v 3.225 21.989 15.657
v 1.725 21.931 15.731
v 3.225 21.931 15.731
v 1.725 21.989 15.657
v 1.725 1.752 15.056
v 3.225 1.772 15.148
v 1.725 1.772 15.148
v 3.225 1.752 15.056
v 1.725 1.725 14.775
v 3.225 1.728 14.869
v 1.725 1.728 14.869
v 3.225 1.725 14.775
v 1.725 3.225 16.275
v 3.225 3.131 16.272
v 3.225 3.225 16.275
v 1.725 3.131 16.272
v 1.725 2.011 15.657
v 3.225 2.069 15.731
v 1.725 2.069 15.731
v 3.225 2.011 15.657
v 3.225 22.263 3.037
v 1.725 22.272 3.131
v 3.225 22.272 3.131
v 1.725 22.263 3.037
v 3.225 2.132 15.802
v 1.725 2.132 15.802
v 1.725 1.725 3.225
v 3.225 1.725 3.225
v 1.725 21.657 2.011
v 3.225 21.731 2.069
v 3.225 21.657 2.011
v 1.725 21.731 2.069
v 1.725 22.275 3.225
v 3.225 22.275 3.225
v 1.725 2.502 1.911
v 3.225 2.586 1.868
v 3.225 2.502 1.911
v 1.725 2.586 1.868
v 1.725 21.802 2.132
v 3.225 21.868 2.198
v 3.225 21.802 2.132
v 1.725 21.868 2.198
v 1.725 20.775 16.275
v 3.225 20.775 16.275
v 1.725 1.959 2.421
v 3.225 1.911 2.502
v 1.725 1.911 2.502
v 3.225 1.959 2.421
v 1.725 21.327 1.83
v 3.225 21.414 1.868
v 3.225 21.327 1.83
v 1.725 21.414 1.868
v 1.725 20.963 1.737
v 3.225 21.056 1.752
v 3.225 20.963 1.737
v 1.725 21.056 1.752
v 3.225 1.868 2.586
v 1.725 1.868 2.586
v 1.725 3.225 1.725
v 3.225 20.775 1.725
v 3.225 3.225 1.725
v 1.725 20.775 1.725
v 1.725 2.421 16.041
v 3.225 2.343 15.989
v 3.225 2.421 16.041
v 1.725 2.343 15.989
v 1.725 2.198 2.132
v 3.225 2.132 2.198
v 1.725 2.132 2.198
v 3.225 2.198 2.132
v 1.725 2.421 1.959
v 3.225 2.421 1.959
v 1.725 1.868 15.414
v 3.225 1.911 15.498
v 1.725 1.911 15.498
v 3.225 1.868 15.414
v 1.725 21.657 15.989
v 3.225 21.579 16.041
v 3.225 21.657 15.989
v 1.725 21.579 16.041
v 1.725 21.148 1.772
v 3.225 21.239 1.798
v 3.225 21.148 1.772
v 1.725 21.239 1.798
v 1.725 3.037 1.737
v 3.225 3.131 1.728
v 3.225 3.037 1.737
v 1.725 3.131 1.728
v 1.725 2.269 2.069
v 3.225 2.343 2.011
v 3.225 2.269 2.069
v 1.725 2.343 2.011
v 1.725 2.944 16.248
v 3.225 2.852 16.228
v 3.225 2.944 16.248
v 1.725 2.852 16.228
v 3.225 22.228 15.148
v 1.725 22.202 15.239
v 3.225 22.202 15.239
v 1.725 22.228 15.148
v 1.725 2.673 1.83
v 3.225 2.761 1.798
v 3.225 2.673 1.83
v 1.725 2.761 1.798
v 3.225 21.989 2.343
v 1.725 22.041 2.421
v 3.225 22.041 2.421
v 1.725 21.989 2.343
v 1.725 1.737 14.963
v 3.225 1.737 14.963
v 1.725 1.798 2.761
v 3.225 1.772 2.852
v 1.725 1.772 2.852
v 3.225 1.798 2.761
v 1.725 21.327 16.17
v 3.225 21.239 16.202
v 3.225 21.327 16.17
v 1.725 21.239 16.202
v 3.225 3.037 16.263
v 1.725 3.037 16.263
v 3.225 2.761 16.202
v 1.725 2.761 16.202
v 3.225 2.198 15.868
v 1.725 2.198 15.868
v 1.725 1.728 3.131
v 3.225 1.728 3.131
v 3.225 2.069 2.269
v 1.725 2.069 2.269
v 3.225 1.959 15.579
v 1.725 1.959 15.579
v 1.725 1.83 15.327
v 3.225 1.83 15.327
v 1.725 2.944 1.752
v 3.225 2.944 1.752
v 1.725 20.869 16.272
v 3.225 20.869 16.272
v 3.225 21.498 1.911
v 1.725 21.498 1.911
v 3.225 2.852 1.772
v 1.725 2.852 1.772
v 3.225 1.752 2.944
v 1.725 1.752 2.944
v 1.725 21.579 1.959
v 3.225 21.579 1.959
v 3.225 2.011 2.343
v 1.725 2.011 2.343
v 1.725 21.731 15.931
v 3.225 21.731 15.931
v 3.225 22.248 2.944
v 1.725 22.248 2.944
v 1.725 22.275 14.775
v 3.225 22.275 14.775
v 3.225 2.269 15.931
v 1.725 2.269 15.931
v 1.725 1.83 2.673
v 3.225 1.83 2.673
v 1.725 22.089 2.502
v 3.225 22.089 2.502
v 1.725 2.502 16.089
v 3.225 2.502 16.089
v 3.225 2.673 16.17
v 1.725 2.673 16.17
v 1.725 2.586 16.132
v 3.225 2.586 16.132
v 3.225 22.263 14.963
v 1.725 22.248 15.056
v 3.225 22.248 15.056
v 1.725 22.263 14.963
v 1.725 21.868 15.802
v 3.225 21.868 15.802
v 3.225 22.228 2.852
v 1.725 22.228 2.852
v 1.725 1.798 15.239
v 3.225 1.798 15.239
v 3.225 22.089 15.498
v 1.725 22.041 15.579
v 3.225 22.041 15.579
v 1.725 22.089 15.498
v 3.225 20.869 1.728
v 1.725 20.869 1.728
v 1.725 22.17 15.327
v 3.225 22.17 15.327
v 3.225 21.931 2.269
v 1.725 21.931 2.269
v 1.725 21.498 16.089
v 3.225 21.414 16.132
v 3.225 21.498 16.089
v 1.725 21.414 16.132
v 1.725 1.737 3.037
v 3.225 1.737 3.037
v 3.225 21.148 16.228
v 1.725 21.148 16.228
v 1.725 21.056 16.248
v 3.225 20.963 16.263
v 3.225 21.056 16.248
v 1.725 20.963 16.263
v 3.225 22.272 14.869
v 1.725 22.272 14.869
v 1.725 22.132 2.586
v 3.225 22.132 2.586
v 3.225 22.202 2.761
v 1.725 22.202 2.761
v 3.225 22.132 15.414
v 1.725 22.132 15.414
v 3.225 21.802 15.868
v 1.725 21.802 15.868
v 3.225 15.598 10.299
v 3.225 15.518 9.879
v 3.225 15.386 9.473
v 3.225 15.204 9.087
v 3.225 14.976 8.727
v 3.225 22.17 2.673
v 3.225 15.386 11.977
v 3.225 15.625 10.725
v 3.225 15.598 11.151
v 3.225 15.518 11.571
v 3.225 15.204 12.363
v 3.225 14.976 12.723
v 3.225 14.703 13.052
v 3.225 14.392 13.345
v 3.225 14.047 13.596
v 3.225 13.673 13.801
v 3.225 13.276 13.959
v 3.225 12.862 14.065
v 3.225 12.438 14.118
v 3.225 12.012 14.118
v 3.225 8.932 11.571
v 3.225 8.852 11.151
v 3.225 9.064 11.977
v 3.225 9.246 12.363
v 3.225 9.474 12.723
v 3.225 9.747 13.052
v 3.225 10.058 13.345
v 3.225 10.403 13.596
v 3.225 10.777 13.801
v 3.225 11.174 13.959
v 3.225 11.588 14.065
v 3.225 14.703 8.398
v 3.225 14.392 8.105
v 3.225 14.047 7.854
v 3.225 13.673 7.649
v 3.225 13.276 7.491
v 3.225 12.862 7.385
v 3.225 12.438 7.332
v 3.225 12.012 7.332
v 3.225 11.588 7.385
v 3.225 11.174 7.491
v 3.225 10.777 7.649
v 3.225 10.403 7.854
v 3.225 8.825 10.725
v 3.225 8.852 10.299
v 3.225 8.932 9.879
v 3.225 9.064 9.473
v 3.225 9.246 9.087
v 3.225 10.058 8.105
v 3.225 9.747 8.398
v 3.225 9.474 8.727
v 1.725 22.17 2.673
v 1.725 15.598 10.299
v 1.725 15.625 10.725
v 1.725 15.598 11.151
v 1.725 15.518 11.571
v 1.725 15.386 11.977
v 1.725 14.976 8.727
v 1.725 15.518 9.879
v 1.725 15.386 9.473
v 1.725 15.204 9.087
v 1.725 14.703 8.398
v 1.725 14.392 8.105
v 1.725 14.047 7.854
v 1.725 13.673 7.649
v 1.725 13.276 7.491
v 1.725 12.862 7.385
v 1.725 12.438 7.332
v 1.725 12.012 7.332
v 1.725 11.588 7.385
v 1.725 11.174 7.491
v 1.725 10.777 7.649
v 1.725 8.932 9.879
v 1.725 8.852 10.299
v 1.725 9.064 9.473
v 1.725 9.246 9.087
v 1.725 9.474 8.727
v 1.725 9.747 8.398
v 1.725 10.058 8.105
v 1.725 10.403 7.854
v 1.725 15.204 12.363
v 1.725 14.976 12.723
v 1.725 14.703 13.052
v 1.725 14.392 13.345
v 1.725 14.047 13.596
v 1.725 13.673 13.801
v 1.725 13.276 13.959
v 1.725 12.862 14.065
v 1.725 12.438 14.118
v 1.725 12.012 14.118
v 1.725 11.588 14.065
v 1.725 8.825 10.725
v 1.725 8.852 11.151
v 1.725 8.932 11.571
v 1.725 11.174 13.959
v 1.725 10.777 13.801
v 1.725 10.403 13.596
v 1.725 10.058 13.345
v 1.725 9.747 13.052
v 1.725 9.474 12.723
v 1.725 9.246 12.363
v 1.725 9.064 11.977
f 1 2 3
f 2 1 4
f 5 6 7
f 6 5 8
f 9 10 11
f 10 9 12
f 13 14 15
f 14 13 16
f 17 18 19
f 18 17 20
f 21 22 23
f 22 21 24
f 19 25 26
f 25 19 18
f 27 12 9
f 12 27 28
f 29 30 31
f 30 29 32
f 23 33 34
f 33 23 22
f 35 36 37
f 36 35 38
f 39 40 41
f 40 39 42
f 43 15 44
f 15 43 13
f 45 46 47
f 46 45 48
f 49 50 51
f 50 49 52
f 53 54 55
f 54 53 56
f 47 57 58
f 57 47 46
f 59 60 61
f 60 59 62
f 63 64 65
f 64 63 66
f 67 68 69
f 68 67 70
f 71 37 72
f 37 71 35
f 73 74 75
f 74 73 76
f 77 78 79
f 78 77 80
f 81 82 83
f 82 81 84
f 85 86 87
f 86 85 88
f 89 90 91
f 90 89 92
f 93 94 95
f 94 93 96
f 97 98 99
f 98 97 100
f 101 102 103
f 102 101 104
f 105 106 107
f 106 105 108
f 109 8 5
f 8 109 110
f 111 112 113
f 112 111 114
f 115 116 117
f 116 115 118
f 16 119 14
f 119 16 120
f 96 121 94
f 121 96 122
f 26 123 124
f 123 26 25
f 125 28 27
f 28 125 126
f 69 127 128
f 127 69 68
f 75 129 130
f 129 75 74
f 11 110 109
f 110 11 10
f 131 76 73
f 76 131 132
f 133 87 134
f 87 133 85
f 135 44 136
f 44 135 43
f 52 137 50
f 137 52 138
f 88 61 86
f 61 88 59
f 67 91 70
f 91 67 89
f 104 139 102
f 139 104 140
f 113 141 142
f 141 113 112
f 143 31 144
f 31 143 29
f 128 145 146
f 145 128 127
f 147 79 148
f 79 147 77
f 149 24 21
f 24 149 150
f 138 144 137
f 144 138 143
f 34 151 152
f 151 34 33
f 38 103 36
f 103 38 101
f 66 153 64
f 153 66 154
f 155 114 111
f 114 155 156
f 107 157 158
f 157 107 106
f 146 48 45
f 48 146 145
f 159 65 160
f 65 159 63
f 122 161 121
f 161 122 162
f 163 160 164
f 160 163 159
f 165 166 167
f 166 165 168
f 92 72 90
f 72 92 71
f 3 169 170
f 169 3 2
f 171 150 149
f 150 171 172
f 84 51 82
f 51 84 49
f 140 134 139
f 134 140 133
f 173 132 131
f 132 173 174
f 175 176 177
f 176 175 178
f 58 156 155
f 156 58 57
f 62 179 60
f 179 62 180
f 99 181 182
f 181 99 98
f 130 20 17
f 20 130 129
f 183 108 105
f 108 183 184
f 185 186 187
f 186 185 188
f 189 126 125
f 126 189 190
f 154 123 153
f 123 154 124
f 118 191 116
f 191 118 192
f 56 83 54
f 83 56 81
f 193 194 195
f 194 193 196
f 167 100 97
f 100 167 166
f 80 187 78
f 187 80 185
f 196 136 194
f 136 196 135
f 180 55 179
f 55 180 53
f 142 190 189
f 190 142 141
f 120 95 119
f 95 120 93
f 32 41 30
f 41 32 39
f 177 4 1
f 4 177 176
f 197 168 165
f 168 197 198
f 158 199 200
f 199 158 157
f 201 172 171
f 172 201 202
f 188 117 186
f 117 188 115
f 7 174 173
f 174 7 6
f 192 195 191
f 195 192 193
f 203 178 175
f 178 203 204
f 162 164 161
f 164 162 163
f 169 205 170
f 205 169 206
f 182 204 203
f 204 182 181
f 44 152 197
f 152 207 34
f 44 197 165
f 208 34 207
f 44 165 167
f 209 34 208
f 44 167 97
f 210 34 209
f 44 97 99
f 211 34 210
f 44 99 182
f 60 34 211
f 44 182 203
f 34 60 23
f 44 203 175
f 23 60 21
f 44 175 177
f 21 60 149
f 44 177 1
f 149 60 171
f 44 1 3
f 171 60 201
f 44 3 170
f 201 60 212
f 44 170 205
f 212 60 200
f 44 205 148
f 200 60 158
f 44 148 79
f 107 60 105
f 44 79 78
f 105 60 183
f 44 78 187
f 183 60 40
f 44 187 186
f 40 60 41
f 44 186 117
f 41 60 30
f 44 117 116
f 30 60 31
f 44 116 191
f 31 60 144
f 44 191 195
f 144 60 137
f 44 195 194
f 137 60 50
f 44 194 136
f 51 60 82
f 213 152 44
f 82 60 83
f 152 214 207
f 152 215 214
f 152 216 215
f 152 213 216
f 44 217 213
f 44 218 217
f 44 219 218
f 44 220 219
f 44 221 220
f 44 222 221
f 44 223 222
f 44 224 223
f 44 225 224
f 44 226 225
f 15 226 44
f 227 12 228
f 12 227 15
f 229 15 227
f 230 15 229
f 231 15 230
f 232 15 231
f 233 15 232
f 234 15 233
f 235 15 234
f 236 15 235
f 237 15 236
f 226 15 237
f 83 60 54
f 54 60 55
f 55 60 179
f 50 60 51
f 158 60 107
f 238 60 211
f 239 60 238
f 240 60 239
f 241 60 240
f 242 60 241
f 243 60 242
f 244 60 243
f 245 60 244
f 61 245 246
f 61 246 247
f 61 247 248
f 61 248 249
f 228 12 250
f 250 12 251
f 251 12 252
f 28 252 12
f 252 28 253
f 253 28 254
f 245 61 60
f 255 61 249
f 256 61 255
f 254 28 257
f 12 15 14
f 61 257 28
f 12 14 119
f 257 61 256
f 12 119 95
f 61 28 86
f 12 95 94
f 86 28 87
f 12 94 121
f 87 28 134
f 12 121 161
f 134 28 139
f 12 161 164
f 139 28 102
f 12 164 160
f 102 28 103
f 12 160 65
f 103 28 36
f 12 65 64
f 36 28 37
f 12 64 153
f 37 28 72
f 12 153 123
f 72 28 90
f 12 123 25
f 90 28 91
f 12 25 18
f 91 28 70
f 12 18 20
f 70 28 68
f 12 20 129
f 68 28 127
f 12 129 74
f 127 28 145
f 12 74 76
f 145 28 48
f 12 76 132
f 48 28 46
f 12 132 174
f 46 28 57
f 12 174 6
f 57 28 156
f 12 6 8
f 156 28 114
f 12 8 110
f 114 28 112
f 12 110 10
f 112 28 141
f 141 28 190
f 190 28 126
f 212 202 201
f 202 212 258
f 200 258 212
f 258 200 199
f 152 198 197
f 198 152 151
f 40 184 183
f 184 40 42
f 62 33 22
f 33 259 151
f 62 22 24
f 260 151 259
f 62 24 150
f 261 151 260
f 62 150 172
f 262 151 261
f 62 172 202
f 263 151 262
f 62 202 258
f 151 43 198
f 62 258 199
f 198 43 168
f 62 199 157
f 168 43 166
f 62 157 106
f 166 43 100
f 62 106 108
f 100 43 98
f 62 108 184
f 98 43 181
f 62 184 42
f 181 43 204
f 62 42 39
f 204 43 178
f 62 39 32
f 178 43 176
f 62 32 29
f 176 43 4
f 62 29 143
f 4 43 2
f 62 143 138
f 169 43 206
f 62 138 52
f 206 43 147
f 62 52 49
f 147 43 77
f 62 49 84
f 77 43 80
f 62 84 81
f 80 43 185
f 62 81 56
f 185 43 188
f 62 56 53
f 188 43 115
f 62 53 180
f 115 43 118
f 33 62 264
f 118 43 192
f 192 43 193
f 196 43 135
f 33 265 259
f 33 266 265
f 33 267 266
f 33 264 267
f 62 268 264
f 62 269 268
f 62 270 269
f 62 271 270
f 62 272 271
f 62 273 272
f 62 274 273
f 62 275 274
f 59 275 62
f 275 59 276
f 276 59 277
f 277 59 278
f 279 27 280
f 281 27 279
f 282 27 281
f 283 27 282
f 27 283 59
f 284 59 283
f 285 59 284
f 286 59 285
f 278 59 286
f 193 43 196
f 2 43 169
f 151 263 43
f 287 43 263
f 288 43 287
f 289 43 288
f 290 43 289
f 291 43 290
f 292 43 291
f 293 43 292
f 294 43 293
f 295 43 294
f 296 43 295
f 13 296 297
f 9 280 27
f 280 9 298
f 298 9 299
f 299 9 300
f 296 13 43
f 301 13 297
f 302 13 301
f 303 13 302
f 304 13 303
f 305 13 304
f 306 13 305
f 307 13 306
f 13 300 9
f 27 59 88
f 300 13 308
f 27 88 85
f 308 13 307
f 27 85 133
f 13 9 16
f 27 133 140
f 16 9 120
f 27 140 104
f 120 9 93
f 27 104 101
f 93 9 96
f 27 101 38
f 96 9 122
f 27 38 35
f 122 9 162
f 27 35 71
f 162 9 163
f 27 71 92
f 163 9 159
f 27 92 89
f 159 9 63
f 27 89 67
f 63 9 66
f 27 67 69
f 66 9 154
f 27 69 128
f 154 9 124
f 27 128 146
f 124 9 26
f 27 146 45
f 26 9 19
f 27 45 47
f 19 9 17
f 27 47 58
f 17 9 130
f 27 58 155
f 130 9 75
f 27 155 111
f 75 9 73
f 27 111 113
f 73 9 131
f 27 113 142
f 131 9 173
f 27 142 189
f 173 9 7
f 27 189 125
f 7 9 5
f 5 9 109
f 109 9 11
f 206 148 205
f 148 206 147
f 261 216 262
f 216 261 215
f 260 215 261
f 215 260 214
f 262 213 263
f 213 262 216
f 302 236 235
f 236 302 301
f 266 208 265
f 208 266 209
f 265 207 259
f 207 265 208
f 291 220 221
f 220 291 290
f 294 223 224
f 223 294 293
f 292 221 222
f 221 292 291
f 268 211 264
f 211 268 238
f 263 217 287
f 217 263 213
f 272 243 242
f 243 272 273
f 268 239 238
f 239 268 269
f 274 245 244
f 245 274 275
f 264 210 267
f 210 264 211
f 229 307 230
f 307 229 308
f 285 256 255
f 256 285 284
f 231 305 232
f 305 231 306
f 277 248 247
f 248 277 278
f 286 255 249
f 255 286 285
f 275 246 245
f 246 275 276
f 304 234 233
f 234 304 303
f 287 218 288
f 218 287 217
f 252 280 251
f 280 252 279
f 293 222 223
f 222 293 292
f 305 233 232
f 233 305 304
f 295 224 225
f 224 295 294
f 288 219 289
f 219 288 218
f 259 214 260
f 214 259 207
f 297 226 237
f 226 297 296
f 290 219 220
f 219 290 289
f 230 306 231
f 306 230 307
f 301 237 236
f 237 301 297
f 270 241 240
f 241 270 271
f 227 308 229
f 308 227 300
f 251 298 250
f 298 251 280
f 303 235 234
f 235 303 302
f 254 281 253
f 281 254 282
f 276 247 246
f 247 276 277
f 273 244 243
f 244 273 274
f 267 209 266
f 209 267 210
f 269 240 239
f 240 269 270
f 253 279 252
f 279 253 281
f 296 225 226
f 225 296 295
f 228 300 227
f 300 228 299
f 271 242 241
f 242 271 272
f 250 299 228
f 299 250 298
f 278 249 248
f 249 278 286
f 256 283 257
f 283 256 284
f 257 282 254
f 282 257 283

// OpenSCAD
/*//////////////////////////////////////////////////////////////////
              -    FB Aka Heartman/Hearty 2016     -                   
              -   http://heartygfx.blogspot.com    -                  
              -       OpenScad Parametric Box      -                     
              -         CC BY-NC 3.0 License       -                      
////////////////////////////////////////////////////////////////////                                                                                                             
12/02/2016 - Fixed minor bug 
28/02/2016 - Added holes ventilation option                    
09/03/2016 - Added PCB feet support, fixed the shell artefact on export mode. 

*/////////////////////////// - Info - //////////////////////////////

// All coordinates are starting as integrated circuit pins.
// From the top view :

//   CoordD           <---       CoordC
//                                 ^
//                                 ^
//                                 ^
//   CoordA           --->       CoordB


////////////////////////////////////////////////////////////////////


////////// - Paramètres de la boite - Box parameters - /////////////

/* [Box dimensions] */
// - Longueur - Length  
  Length        = 55;       
// - Largeur - Width
  Width         = 24;                     
// - Hauteur - Height  
  Height        = 18;  
// - Epaisseur - Wall thickness  
  Thick         = 1.5;//[2:5]  
  
/* [Box options] */
// - Diamètre Coin arrondi - Filet diameter  
  Filet         = 1.5;//[0.1:12] 
// - lissage de l'arrondi - Filet smoothness  
  Resolution    = 50;//[1:100] 
// - Tolérance - Tolerance (Panel/rails gap)
  m             = 0.45;
// Pieds PCB - PCB feet (x4) 
  PCBFeet       = 0;// [0:No, 1:Yes]
  TPCBFeet      = 0;// Top [0:No, 1:Yes]
  LCDFeet       = 0;// Top [0:No, 1:Yes]
// - Decorations to ventilation holes
  Vent          = 0;// [0:No, 1:Yes]
// - Decoration-Holes width (in mm)
  Vent_width    = 0;   

/* [PCB_Feet bottom] */
//All dimensions are from the center foot axis
// - Coin bas gauche - Low left corner X position
PCBPosX         = -3.8;
// - Coin bas gauche - Low left corner Y position
PCBPosY         = 0.5;
// - Longueur PCB - PCB Length
PCBLength       = 68.6;
// - Largeur PCB - PCB Width
PCBWidth        = 53.3;
// - Heuteur pied - Feet height
FootHeight      = 8;
// - Diamètre pied - Foot diameter
FootDia         = 6;
// - Diamètre trou - Hole diameter
FootHole        = 2;  
// - Foot Inset
FootInset       = 2.5;
// feet 1 and 4 are offset horizontally, 2 and 3 are offset vertically
Foot1Offset     = 11.5;
Foot2Offset     = 5.2;
Foot3Offset     = 15.2;
Foot4Offset     = 12.8;

/* [PCB_Feet top] */
//All dimensions are from the center foot axis
// - Coin bas gauche - Low left corner X position
TPCBPosX         = 0;
// - Coin bas gauche - Low left corner Y position
TPCBPosY         = 8;
// - Longueur PCB - PCB Length
TPCBLength       = 52.5;
// - Largeur PCB - PCB Width
TPCBWidth        = 73;
// - Heuteur pied - Feet height
TFootHeight      = 8;
// - Diamètre pied - Foot diameter
TFootDia         = 6;
// - Diamètre trou - Hole diameter
TFootHole        = 2;  

/* [LCD Panel] */
//All dimensions are from the center foot axis
// - Coin bas gauche - Low left corner X position
LCDPosX         = 8;
// - Coin bas gauche - Low left corner Y position
LCDPosY         = -4.25;
// - Longueur PCB - PCB Length
LCDLength       = 80;
// - Largeur PCB - PCB Width
LCDWidth        = 36;
// - Diamètre pied - Foot diameter
LCDFootDia      = 5;
// - Heuteur pied - Feet height
LCDFootHeight      = 9.5;

/* [STL element to export] */
//Coque haut - Top shell
TShell          = 0;// [0:No, 1:Yes]
//Coque bas- Bottom shell
BShell          = 0;// [0:No, 1:Yes]
//Panneau avant - Front panel
FPanL           = 0;// [0:No, 1:Yes]
//Panneau arrière - Back panel  
BPanL           = 1;// [0:No, 1:Yes]

/* [Hidden] */
// - Couleur coque - Shell color  
Couleur1        = "Orange";       
// - Couleur panneaux - Panels color    
Couleur2        = "OrangeRed";    
// Thick X 2 - making decorations thicker if it is a vent to make sure they go through shell
Dec_Thick       = Vent ? Thick*2 : Thick; 
// - Depth decoration
Dec_size        = Vent ? Thick*2 : 0.8;

/////////// - Boitier générique bord arrondis - Generic rounded box - //////////

module RoundBox($a=Length, $b=Width, $c=Height){// Cube bords arrondis
                    $fn=Resolution;            
                    translate([0,Filet,Filet]){  
                    minkowski (){                                              
                        cube ([$a-(Length/2),$b-(2*Filet),$c-(2*Filet)], center = false);
                        rotate([0,90,0]){    
                        cylinder(r=Filet,h=Length/2, center = false);
                            } 
                        }
                    }
                }// End of RoundBox Module

      
////////////////////////////////// - Module Coque/Shell - //////////////////////////////////         

module Coque(){//Coque - Shell  
    Thick = Thick*2;  
    difference(){ //sides positive   
        difference(){ //sides decoration
            union(){ //union main
                difference() {//soustraction de la forme centrale - Substraction Fileted box
                    difference(){//soustraction cube median - Median cube slicer
                        union() {//union               
                            difference(){//Coque    
                                RoundBox();
                                translate([Thick/2,Thick/2,Thick/2]){     
                                    RoundBox($a=Length-Thick, $b=Width-Thick, $c=Height-Thick);
                                }
                            }//Fin diff Coque                            

                            difference(){//largeur Rails        
                                translate([Thick+m,Thick/2,Thick/2]){// Rails
                                    RoundBox($a=Length-((2*Thick)+(2*m)), $b=Width-Thick, $c=Height-(Thick*2));
                                }//fin Rails

                                translate([((Thick+m/2)*1.55),Thick/2,Thick/2+0.1]){ // +0.1 added to avoid the artefact
                                    RoundBox($a=Length-((Thick*3)+2*m), $b=Width-Thick, $c=Height-Thick);
                                }           
                            }//Fin largeur Rails
                        }//Fin union                                   
 
                        translate([-Thick,-Thick,Height/2]){// Cube à soustraire
                            cube ([Length+100, Width+100, Height], center=false);
                        }                                            
                    }//fin soustraction cube median - End Median cube slicer

                    translate([-Thick/2,Thick,Thick]){// Forme de soustraction centrale 
                        RoundBox($a=Length+Thick, $b=Width-Thick*2, $c=Height-Thick);       
                    }                          
                } // fin soustraction de la forme centrale

                difference(){// wall fixation box legs
                    union(){
                        translate([3*Thick +5,Thick,Height/2]){
                            rotate([90,0,0]){
                                $fn=6;
                                cylinder(d=11,Thick/2);
                            }   
                        }
                            
                        translate([Length-((3*Thick)+5),Thick,Height/2]){
                            rotate([90,0,0]){
                                $fn=6;
                                cylinder(d=11,Thick/2);
                            }   
                        }
                    }
                    translate([4,Thick+Filet,Height/2-57]){   
                        rotate([45,0,0]){
                            cube([Length,40,40]);    
                        }
                    }
                    translate([0,-(Thick*1.46),Height/2]){
                        cube([Length,Thick*2,10]);
                    }
                } //Fin fixation box legs
            }//fin union main

            union(){// negative of outbox sides decorations
                for(i=[0:Thick:Length/2]){
                    // Ventilation holes part code submitted by Ettie - Thanks ;) 
                    translate([10+i,-Dec_Thick+Dec_size,1]){
                        cube([Vent_width,Dec_Thick,Height/4]);
                    }
                    translate([(Length-10) - i,-Dec_Thick+Dec_size,1]){
                        cube([Vent_width,Dec_Thick,Height/4]);
                    }
                    translate([(Length-10) - i,Width-Dec_size,1]){
                        cube([Vent_width,Dec_Thick,Height/4]);
                    }
                    translate([10+i,Width-Dec_size,1]){
                        cube([Vent_width,Dec_Thick,Height/4]);
                    }
                }// fin de for
            }//fin un decoration negative
        }//fin difference decoration


        union(){ //sides holes
            $fn=50;
            translate([3*Thick+5,20,Height/2+2]){
                rotate([90,0,0]){
                    cylinder(d=2,20);
                }
            }
            translate([Length-((3*Thick)+5),20,Height/2+2]){
                rotate([90,0,0]){
                    cylinder(d=2,20);
                }
            }
            translate([3*Thick+5,Width+5,Height/2-2]){
                rotate([90,0,0]){
                    cylinder(d=2,Thick+5);
                }
            }
            translate([Length-((3*Thick)+5),Width+5,Height/2-2]){
                rotate([90,0,0]){
                    cylinder(d=2,Thick+5);
                }
            }
        }//fin de sides holes
    }//fin de difference holes

    difference(){
        translate([Thick+11.5,1,.5])
            Panel(Length,Width+1.5,Thick/2,Filet/2);
        translate([11+Thick,-2,3])
            cube([Thick+2,Width+Thick*2+1,Height-5]);
    }

}// fin coque 

////////////////////////////// - Experiment - ///////////////////////////////////////////





/////////////////////// - Foot with base filet - /////////////////////////////
module foot(Footx, Footy, Footz, FootDia,FootHole,FootHeight){
    Filet=2;
    color(Couleur1)   
    translate([Footx,Footy,Footz+Filet-1.5])
    difference(){
        cylinder(d=FootDia+Filet,FootHeight-Thick, $fn=100);
        rotate_extrude($fn=100){
            translate([(FootDia+Filet*2)/2,Filet,0]){
                minkowski(){
                    square(10);
                    circle(Filet, $fn=100);
                }
            }
        }
        cylinder(d=FootHole,FootHeight+1, $fn=100);
    }          
}// Fin module foot
  
module Feet(BoardLength,BoardWidth,FHeight,FDia,FHole,F1Offset,F2Offset,F3Offset,F4Offset){     
    //////////////// - PCB only visible in the preview mode - /////////////////////    
    translate([3*Thick+2,Thick+5,FHeight+(Thick/2)-0.5]){
    
        %square ([BoardLength,BoardWidth]);
        translate([BoardLength/2,BoardWidth/2,0.5]){ 
            color("Olive")
            %text("PCB", halign="center", valign="center", font="Arial black");
        }
    } // Fin PCB 
  
    
////////////////////////////// - Feet - //////////////////////////////////////////
//    translate([(3*Thick+2)+FootInset+F1Offset,(Thick+5)+FootInset,Thick/2]){
        foot((3*Thick+2)+FootInset+F1Offset,(Thick+5)+FootInset,Thick/2,FDia,FHole,FHeight);
//    }
//    translate([(3*Thick+2)+BoardLength-FootInset,(Thick+5)+F2Offset+FootInset,Thick/2]){
        foot((3*Thick+2)+BoardLength-FootInset,(Thick+5)+F2Offset+FootInset,Thick/2,FDia,FHole,FHeight);
//    }
//    translate([(3*Thick+2)+BoardLength-FootInset,(Thick+5)+BoardWidth-FootInset-F3Offset,Thick/2] {
        foot((3*Thick+2)+BoardLength-FootInset,(Thick+5)+BoardWidth-FootInset-F3Offset,Thick/2,FDia,FHole,FHeight);
//    -}        
//    translate([(3*Thick+2)+FootInset+F4Offset,(Thick+5)+BoardWidth-FootInset,Thick/2]){
        foot((3*Thick+2)+FootInset+F4Offset,(Thick+5)+BoardWidth-FootInset,Thick/2,FDia,FHole,FHeight);
//    }        

} // Fin du module Feet
 
 ////////////////////////////////////////////////////////////////////////
////////////////////// <- Holes Panel Manager -> ///////////////////////
////////////////////////////////////////////////////////////////////////

//                           <- Panel ->  
module Panel(Length,Width,Thick,Filet){
    scale([0.5,1,1])
    minkowski(){
            cube([Thick,Width-(Thick*2+Filet*2+m),Height-(Thick*2+Filet*2+m)]);
            translate([0,Filet,Filet])
                rotate([0,90,0])
                    cylinder(r=Filet,h=Thick, $fn=100);
    }
}

//                          <- Circle hole -> 
// Cx=Cylinder X position | Cy=Cylinder Y position | Cdia= Cylinder dia | Cheight=Cyl height
module CylinderHole(OnOff,Cx,Cy,Cdia){
    if(OnOff==1)
        translate([Cx,Cy,-1])
            cylinder(d=Cdia,10, $fn=50);
}
//                          <- Square hole ->  
// Sx=Square X position | Sy=Square Y position | Sl= Square Length | Sw=Square Width | Filet = Round corner
module SquareHole(OnOff,Sx,Sy,Sl,Sw,Filet){
    if(OnOff==1)
     minkowski(){
        translate([Sx+Filet/2,Sy+Filet/2,-1])
            cube([Sl-Filet,Sw-Filet,10]);
            cylinder(d=Filet,h=10, $fn=100);
       }
}


 
//                      <- Linear text panel -> 
module LText(OnOff,Tx,Ty,Font,Size,Content){
    if(OnOff==1)
    translate([Tx,Ty,Thick+.5])
    linear_extrude(height = 1){
    text(Content, size=Size, font=Font);
    }
}
//                     <- Circular text panel->  
module CText(OnOff,Tx,Ty,Font,Size,TxtRadius,Angl,Turn,Content){ 
      if(OnOff==1) {
      Angle = -Angl / len(Content);
      translate([Tx,Ty,Thick+.5])
          for (i= [0:len(Content)-1] ){   
              rotate([0,0,i*Angle+90+Turn])
              translate([0,TxtRadius,0]) {
                linear_extrude(height = 1){
                text(Content[i], font = Font, size = Size,  valign ="baseline", halign ="center");
                    }
                }   
             }
      }
}
////////////////////// <- New module Panel -> //////////////////////
module FPanL(){
    if (LCDFeet==1) {
        rotate([180,270,180]){
            translate([LCDPosX,LCDPosY,0-Thick]){ 
                Feet(LCDWidth,LCDLength,LCDFootHeight,LCDFootDia,FootHole,0,0,0,0);
            }
        }
    }

    difference(){
        color(Couleur2) {
            Panel(Length,Width,Thick,Filet);
        }

        rotate([90,0,90]){
            color(Couleur2){
                //                     <- Cutting shapes from here ->  
                SquareHole  (0,6.5,22,72,25,1); //(On/Off, Xpos,Ypos,Length,Width,Filet)
                CylinderHole(0,Width/2-Thick,Height-5,6);       //(On/Off, Xpos, Ypos, Diameter)
                //                            <- To here -> 
            }
            translate ([-.75,0,-.85]){
//                     <- Adding text from here ->          
                LText(0,42,49,"Arial Black",4,"VPDMon 1.0");//(On/Off, Xpos, Ypos, "Font", Size, "Text")
                CText(0,20,11.8,"Arial Black",2.4,5,260,25,"1.3.5.7.9");//(On/Off, Xpos, Ypos, "Font", Size, Diameter, Arc(Deg), Starting Angle(Deg),"Text")
//                            <- To here ->
            }
        }
    }
}

module BPanL(Colour){
    difference(){
        Panel(Length,Width,Thick,Filet);
 
        rotate([90,0,90]){
            color(Colour){
//                     <- Cutting shapes from here ->
            SquareHole  (0,36.7,7,12,10.5,1); //(On/Off, Xpos,Ypos,Length,Width,Filet)
            CylinderHole(1,Width/2-Thick,Height-9,6.8);       //(On/Off, Xpos, Ypos, Diameter)
//                            <- To here -> 

            rotate([0,180,0])
            translate ([-96,-1,-3.35]){
//                     <- Adding text from here ->          
                LText(0,3,50,"Arial Black",3,"7g");//(On/Off, Xpos, Ypos, "Font", Size, "Text")
                CText(0,20,11.8,"Arial Black",2.4,5,260,25,"1.3.5.7.9");//(On/Off, Xpos, Ypos, "Font", Size, Diameter, Arc(Deg), Starting Angle(Deg),"Text")
//                            <- To here ->
            }
         }
      }
   }
}


/////////////////////////// <- Main part -> /////////////////////////

if(BShell==1) {
    // Coque bas - Bottom shell
    color(Couleur1){ 
        difference() {
            Coque();
            SquareHole(1,9,Width/2-7.5,20.2,15.7,0); //(On/Off, Xpos,Ypos,Length,Width,Filet)
        }
    }

    // Pied support PCB - PCB feet
    if (PCBFeet==1) {
    // Feet
        translate([PCBPosX,PCBPosY,0]){ 
            Feet(PCBLength,PCBWidth,FootHeight,FootDia,FootHole,Foot1Offset,Foot2Offset,Foot3Offset,Foot4Offset);
        }
    }
    foot(35.5, Width/2, Thick, FootDia,FootHole,Thick+2);
}

if(TShell==1) {
// Coque haut - Top Shell
    translate([0,Width,Height+0.2]){
        rotate([0,180,180]){
            color( Couleur1,1){
                Coque();
            }
            if (TPCBFeet==1) {
                translate([TPCBPosX,TPCBPosY,0]){ 
                    Feet(TPCBLength,TPCBWidth,TFootHeight,TFootDia,TFootHole,0,0,0,0);
                }
            }
        }
    }
}

// Panneau avant - Front panel  <<<<<< Text and holes only on this one.
//rotate([0,-90,-90]) 
if(FPanL==1)
        translate([Length-(Thick*2+m/2),Thick+m/2,Thick+m/2])
        FPanL();

//Panneau arrière - Back panel
if(BPanL==1)
        color(Couleur2)
        translate([Thick+m/2,Thick+m/2,Thick+m/2])
        BPanL(Couleur2);
